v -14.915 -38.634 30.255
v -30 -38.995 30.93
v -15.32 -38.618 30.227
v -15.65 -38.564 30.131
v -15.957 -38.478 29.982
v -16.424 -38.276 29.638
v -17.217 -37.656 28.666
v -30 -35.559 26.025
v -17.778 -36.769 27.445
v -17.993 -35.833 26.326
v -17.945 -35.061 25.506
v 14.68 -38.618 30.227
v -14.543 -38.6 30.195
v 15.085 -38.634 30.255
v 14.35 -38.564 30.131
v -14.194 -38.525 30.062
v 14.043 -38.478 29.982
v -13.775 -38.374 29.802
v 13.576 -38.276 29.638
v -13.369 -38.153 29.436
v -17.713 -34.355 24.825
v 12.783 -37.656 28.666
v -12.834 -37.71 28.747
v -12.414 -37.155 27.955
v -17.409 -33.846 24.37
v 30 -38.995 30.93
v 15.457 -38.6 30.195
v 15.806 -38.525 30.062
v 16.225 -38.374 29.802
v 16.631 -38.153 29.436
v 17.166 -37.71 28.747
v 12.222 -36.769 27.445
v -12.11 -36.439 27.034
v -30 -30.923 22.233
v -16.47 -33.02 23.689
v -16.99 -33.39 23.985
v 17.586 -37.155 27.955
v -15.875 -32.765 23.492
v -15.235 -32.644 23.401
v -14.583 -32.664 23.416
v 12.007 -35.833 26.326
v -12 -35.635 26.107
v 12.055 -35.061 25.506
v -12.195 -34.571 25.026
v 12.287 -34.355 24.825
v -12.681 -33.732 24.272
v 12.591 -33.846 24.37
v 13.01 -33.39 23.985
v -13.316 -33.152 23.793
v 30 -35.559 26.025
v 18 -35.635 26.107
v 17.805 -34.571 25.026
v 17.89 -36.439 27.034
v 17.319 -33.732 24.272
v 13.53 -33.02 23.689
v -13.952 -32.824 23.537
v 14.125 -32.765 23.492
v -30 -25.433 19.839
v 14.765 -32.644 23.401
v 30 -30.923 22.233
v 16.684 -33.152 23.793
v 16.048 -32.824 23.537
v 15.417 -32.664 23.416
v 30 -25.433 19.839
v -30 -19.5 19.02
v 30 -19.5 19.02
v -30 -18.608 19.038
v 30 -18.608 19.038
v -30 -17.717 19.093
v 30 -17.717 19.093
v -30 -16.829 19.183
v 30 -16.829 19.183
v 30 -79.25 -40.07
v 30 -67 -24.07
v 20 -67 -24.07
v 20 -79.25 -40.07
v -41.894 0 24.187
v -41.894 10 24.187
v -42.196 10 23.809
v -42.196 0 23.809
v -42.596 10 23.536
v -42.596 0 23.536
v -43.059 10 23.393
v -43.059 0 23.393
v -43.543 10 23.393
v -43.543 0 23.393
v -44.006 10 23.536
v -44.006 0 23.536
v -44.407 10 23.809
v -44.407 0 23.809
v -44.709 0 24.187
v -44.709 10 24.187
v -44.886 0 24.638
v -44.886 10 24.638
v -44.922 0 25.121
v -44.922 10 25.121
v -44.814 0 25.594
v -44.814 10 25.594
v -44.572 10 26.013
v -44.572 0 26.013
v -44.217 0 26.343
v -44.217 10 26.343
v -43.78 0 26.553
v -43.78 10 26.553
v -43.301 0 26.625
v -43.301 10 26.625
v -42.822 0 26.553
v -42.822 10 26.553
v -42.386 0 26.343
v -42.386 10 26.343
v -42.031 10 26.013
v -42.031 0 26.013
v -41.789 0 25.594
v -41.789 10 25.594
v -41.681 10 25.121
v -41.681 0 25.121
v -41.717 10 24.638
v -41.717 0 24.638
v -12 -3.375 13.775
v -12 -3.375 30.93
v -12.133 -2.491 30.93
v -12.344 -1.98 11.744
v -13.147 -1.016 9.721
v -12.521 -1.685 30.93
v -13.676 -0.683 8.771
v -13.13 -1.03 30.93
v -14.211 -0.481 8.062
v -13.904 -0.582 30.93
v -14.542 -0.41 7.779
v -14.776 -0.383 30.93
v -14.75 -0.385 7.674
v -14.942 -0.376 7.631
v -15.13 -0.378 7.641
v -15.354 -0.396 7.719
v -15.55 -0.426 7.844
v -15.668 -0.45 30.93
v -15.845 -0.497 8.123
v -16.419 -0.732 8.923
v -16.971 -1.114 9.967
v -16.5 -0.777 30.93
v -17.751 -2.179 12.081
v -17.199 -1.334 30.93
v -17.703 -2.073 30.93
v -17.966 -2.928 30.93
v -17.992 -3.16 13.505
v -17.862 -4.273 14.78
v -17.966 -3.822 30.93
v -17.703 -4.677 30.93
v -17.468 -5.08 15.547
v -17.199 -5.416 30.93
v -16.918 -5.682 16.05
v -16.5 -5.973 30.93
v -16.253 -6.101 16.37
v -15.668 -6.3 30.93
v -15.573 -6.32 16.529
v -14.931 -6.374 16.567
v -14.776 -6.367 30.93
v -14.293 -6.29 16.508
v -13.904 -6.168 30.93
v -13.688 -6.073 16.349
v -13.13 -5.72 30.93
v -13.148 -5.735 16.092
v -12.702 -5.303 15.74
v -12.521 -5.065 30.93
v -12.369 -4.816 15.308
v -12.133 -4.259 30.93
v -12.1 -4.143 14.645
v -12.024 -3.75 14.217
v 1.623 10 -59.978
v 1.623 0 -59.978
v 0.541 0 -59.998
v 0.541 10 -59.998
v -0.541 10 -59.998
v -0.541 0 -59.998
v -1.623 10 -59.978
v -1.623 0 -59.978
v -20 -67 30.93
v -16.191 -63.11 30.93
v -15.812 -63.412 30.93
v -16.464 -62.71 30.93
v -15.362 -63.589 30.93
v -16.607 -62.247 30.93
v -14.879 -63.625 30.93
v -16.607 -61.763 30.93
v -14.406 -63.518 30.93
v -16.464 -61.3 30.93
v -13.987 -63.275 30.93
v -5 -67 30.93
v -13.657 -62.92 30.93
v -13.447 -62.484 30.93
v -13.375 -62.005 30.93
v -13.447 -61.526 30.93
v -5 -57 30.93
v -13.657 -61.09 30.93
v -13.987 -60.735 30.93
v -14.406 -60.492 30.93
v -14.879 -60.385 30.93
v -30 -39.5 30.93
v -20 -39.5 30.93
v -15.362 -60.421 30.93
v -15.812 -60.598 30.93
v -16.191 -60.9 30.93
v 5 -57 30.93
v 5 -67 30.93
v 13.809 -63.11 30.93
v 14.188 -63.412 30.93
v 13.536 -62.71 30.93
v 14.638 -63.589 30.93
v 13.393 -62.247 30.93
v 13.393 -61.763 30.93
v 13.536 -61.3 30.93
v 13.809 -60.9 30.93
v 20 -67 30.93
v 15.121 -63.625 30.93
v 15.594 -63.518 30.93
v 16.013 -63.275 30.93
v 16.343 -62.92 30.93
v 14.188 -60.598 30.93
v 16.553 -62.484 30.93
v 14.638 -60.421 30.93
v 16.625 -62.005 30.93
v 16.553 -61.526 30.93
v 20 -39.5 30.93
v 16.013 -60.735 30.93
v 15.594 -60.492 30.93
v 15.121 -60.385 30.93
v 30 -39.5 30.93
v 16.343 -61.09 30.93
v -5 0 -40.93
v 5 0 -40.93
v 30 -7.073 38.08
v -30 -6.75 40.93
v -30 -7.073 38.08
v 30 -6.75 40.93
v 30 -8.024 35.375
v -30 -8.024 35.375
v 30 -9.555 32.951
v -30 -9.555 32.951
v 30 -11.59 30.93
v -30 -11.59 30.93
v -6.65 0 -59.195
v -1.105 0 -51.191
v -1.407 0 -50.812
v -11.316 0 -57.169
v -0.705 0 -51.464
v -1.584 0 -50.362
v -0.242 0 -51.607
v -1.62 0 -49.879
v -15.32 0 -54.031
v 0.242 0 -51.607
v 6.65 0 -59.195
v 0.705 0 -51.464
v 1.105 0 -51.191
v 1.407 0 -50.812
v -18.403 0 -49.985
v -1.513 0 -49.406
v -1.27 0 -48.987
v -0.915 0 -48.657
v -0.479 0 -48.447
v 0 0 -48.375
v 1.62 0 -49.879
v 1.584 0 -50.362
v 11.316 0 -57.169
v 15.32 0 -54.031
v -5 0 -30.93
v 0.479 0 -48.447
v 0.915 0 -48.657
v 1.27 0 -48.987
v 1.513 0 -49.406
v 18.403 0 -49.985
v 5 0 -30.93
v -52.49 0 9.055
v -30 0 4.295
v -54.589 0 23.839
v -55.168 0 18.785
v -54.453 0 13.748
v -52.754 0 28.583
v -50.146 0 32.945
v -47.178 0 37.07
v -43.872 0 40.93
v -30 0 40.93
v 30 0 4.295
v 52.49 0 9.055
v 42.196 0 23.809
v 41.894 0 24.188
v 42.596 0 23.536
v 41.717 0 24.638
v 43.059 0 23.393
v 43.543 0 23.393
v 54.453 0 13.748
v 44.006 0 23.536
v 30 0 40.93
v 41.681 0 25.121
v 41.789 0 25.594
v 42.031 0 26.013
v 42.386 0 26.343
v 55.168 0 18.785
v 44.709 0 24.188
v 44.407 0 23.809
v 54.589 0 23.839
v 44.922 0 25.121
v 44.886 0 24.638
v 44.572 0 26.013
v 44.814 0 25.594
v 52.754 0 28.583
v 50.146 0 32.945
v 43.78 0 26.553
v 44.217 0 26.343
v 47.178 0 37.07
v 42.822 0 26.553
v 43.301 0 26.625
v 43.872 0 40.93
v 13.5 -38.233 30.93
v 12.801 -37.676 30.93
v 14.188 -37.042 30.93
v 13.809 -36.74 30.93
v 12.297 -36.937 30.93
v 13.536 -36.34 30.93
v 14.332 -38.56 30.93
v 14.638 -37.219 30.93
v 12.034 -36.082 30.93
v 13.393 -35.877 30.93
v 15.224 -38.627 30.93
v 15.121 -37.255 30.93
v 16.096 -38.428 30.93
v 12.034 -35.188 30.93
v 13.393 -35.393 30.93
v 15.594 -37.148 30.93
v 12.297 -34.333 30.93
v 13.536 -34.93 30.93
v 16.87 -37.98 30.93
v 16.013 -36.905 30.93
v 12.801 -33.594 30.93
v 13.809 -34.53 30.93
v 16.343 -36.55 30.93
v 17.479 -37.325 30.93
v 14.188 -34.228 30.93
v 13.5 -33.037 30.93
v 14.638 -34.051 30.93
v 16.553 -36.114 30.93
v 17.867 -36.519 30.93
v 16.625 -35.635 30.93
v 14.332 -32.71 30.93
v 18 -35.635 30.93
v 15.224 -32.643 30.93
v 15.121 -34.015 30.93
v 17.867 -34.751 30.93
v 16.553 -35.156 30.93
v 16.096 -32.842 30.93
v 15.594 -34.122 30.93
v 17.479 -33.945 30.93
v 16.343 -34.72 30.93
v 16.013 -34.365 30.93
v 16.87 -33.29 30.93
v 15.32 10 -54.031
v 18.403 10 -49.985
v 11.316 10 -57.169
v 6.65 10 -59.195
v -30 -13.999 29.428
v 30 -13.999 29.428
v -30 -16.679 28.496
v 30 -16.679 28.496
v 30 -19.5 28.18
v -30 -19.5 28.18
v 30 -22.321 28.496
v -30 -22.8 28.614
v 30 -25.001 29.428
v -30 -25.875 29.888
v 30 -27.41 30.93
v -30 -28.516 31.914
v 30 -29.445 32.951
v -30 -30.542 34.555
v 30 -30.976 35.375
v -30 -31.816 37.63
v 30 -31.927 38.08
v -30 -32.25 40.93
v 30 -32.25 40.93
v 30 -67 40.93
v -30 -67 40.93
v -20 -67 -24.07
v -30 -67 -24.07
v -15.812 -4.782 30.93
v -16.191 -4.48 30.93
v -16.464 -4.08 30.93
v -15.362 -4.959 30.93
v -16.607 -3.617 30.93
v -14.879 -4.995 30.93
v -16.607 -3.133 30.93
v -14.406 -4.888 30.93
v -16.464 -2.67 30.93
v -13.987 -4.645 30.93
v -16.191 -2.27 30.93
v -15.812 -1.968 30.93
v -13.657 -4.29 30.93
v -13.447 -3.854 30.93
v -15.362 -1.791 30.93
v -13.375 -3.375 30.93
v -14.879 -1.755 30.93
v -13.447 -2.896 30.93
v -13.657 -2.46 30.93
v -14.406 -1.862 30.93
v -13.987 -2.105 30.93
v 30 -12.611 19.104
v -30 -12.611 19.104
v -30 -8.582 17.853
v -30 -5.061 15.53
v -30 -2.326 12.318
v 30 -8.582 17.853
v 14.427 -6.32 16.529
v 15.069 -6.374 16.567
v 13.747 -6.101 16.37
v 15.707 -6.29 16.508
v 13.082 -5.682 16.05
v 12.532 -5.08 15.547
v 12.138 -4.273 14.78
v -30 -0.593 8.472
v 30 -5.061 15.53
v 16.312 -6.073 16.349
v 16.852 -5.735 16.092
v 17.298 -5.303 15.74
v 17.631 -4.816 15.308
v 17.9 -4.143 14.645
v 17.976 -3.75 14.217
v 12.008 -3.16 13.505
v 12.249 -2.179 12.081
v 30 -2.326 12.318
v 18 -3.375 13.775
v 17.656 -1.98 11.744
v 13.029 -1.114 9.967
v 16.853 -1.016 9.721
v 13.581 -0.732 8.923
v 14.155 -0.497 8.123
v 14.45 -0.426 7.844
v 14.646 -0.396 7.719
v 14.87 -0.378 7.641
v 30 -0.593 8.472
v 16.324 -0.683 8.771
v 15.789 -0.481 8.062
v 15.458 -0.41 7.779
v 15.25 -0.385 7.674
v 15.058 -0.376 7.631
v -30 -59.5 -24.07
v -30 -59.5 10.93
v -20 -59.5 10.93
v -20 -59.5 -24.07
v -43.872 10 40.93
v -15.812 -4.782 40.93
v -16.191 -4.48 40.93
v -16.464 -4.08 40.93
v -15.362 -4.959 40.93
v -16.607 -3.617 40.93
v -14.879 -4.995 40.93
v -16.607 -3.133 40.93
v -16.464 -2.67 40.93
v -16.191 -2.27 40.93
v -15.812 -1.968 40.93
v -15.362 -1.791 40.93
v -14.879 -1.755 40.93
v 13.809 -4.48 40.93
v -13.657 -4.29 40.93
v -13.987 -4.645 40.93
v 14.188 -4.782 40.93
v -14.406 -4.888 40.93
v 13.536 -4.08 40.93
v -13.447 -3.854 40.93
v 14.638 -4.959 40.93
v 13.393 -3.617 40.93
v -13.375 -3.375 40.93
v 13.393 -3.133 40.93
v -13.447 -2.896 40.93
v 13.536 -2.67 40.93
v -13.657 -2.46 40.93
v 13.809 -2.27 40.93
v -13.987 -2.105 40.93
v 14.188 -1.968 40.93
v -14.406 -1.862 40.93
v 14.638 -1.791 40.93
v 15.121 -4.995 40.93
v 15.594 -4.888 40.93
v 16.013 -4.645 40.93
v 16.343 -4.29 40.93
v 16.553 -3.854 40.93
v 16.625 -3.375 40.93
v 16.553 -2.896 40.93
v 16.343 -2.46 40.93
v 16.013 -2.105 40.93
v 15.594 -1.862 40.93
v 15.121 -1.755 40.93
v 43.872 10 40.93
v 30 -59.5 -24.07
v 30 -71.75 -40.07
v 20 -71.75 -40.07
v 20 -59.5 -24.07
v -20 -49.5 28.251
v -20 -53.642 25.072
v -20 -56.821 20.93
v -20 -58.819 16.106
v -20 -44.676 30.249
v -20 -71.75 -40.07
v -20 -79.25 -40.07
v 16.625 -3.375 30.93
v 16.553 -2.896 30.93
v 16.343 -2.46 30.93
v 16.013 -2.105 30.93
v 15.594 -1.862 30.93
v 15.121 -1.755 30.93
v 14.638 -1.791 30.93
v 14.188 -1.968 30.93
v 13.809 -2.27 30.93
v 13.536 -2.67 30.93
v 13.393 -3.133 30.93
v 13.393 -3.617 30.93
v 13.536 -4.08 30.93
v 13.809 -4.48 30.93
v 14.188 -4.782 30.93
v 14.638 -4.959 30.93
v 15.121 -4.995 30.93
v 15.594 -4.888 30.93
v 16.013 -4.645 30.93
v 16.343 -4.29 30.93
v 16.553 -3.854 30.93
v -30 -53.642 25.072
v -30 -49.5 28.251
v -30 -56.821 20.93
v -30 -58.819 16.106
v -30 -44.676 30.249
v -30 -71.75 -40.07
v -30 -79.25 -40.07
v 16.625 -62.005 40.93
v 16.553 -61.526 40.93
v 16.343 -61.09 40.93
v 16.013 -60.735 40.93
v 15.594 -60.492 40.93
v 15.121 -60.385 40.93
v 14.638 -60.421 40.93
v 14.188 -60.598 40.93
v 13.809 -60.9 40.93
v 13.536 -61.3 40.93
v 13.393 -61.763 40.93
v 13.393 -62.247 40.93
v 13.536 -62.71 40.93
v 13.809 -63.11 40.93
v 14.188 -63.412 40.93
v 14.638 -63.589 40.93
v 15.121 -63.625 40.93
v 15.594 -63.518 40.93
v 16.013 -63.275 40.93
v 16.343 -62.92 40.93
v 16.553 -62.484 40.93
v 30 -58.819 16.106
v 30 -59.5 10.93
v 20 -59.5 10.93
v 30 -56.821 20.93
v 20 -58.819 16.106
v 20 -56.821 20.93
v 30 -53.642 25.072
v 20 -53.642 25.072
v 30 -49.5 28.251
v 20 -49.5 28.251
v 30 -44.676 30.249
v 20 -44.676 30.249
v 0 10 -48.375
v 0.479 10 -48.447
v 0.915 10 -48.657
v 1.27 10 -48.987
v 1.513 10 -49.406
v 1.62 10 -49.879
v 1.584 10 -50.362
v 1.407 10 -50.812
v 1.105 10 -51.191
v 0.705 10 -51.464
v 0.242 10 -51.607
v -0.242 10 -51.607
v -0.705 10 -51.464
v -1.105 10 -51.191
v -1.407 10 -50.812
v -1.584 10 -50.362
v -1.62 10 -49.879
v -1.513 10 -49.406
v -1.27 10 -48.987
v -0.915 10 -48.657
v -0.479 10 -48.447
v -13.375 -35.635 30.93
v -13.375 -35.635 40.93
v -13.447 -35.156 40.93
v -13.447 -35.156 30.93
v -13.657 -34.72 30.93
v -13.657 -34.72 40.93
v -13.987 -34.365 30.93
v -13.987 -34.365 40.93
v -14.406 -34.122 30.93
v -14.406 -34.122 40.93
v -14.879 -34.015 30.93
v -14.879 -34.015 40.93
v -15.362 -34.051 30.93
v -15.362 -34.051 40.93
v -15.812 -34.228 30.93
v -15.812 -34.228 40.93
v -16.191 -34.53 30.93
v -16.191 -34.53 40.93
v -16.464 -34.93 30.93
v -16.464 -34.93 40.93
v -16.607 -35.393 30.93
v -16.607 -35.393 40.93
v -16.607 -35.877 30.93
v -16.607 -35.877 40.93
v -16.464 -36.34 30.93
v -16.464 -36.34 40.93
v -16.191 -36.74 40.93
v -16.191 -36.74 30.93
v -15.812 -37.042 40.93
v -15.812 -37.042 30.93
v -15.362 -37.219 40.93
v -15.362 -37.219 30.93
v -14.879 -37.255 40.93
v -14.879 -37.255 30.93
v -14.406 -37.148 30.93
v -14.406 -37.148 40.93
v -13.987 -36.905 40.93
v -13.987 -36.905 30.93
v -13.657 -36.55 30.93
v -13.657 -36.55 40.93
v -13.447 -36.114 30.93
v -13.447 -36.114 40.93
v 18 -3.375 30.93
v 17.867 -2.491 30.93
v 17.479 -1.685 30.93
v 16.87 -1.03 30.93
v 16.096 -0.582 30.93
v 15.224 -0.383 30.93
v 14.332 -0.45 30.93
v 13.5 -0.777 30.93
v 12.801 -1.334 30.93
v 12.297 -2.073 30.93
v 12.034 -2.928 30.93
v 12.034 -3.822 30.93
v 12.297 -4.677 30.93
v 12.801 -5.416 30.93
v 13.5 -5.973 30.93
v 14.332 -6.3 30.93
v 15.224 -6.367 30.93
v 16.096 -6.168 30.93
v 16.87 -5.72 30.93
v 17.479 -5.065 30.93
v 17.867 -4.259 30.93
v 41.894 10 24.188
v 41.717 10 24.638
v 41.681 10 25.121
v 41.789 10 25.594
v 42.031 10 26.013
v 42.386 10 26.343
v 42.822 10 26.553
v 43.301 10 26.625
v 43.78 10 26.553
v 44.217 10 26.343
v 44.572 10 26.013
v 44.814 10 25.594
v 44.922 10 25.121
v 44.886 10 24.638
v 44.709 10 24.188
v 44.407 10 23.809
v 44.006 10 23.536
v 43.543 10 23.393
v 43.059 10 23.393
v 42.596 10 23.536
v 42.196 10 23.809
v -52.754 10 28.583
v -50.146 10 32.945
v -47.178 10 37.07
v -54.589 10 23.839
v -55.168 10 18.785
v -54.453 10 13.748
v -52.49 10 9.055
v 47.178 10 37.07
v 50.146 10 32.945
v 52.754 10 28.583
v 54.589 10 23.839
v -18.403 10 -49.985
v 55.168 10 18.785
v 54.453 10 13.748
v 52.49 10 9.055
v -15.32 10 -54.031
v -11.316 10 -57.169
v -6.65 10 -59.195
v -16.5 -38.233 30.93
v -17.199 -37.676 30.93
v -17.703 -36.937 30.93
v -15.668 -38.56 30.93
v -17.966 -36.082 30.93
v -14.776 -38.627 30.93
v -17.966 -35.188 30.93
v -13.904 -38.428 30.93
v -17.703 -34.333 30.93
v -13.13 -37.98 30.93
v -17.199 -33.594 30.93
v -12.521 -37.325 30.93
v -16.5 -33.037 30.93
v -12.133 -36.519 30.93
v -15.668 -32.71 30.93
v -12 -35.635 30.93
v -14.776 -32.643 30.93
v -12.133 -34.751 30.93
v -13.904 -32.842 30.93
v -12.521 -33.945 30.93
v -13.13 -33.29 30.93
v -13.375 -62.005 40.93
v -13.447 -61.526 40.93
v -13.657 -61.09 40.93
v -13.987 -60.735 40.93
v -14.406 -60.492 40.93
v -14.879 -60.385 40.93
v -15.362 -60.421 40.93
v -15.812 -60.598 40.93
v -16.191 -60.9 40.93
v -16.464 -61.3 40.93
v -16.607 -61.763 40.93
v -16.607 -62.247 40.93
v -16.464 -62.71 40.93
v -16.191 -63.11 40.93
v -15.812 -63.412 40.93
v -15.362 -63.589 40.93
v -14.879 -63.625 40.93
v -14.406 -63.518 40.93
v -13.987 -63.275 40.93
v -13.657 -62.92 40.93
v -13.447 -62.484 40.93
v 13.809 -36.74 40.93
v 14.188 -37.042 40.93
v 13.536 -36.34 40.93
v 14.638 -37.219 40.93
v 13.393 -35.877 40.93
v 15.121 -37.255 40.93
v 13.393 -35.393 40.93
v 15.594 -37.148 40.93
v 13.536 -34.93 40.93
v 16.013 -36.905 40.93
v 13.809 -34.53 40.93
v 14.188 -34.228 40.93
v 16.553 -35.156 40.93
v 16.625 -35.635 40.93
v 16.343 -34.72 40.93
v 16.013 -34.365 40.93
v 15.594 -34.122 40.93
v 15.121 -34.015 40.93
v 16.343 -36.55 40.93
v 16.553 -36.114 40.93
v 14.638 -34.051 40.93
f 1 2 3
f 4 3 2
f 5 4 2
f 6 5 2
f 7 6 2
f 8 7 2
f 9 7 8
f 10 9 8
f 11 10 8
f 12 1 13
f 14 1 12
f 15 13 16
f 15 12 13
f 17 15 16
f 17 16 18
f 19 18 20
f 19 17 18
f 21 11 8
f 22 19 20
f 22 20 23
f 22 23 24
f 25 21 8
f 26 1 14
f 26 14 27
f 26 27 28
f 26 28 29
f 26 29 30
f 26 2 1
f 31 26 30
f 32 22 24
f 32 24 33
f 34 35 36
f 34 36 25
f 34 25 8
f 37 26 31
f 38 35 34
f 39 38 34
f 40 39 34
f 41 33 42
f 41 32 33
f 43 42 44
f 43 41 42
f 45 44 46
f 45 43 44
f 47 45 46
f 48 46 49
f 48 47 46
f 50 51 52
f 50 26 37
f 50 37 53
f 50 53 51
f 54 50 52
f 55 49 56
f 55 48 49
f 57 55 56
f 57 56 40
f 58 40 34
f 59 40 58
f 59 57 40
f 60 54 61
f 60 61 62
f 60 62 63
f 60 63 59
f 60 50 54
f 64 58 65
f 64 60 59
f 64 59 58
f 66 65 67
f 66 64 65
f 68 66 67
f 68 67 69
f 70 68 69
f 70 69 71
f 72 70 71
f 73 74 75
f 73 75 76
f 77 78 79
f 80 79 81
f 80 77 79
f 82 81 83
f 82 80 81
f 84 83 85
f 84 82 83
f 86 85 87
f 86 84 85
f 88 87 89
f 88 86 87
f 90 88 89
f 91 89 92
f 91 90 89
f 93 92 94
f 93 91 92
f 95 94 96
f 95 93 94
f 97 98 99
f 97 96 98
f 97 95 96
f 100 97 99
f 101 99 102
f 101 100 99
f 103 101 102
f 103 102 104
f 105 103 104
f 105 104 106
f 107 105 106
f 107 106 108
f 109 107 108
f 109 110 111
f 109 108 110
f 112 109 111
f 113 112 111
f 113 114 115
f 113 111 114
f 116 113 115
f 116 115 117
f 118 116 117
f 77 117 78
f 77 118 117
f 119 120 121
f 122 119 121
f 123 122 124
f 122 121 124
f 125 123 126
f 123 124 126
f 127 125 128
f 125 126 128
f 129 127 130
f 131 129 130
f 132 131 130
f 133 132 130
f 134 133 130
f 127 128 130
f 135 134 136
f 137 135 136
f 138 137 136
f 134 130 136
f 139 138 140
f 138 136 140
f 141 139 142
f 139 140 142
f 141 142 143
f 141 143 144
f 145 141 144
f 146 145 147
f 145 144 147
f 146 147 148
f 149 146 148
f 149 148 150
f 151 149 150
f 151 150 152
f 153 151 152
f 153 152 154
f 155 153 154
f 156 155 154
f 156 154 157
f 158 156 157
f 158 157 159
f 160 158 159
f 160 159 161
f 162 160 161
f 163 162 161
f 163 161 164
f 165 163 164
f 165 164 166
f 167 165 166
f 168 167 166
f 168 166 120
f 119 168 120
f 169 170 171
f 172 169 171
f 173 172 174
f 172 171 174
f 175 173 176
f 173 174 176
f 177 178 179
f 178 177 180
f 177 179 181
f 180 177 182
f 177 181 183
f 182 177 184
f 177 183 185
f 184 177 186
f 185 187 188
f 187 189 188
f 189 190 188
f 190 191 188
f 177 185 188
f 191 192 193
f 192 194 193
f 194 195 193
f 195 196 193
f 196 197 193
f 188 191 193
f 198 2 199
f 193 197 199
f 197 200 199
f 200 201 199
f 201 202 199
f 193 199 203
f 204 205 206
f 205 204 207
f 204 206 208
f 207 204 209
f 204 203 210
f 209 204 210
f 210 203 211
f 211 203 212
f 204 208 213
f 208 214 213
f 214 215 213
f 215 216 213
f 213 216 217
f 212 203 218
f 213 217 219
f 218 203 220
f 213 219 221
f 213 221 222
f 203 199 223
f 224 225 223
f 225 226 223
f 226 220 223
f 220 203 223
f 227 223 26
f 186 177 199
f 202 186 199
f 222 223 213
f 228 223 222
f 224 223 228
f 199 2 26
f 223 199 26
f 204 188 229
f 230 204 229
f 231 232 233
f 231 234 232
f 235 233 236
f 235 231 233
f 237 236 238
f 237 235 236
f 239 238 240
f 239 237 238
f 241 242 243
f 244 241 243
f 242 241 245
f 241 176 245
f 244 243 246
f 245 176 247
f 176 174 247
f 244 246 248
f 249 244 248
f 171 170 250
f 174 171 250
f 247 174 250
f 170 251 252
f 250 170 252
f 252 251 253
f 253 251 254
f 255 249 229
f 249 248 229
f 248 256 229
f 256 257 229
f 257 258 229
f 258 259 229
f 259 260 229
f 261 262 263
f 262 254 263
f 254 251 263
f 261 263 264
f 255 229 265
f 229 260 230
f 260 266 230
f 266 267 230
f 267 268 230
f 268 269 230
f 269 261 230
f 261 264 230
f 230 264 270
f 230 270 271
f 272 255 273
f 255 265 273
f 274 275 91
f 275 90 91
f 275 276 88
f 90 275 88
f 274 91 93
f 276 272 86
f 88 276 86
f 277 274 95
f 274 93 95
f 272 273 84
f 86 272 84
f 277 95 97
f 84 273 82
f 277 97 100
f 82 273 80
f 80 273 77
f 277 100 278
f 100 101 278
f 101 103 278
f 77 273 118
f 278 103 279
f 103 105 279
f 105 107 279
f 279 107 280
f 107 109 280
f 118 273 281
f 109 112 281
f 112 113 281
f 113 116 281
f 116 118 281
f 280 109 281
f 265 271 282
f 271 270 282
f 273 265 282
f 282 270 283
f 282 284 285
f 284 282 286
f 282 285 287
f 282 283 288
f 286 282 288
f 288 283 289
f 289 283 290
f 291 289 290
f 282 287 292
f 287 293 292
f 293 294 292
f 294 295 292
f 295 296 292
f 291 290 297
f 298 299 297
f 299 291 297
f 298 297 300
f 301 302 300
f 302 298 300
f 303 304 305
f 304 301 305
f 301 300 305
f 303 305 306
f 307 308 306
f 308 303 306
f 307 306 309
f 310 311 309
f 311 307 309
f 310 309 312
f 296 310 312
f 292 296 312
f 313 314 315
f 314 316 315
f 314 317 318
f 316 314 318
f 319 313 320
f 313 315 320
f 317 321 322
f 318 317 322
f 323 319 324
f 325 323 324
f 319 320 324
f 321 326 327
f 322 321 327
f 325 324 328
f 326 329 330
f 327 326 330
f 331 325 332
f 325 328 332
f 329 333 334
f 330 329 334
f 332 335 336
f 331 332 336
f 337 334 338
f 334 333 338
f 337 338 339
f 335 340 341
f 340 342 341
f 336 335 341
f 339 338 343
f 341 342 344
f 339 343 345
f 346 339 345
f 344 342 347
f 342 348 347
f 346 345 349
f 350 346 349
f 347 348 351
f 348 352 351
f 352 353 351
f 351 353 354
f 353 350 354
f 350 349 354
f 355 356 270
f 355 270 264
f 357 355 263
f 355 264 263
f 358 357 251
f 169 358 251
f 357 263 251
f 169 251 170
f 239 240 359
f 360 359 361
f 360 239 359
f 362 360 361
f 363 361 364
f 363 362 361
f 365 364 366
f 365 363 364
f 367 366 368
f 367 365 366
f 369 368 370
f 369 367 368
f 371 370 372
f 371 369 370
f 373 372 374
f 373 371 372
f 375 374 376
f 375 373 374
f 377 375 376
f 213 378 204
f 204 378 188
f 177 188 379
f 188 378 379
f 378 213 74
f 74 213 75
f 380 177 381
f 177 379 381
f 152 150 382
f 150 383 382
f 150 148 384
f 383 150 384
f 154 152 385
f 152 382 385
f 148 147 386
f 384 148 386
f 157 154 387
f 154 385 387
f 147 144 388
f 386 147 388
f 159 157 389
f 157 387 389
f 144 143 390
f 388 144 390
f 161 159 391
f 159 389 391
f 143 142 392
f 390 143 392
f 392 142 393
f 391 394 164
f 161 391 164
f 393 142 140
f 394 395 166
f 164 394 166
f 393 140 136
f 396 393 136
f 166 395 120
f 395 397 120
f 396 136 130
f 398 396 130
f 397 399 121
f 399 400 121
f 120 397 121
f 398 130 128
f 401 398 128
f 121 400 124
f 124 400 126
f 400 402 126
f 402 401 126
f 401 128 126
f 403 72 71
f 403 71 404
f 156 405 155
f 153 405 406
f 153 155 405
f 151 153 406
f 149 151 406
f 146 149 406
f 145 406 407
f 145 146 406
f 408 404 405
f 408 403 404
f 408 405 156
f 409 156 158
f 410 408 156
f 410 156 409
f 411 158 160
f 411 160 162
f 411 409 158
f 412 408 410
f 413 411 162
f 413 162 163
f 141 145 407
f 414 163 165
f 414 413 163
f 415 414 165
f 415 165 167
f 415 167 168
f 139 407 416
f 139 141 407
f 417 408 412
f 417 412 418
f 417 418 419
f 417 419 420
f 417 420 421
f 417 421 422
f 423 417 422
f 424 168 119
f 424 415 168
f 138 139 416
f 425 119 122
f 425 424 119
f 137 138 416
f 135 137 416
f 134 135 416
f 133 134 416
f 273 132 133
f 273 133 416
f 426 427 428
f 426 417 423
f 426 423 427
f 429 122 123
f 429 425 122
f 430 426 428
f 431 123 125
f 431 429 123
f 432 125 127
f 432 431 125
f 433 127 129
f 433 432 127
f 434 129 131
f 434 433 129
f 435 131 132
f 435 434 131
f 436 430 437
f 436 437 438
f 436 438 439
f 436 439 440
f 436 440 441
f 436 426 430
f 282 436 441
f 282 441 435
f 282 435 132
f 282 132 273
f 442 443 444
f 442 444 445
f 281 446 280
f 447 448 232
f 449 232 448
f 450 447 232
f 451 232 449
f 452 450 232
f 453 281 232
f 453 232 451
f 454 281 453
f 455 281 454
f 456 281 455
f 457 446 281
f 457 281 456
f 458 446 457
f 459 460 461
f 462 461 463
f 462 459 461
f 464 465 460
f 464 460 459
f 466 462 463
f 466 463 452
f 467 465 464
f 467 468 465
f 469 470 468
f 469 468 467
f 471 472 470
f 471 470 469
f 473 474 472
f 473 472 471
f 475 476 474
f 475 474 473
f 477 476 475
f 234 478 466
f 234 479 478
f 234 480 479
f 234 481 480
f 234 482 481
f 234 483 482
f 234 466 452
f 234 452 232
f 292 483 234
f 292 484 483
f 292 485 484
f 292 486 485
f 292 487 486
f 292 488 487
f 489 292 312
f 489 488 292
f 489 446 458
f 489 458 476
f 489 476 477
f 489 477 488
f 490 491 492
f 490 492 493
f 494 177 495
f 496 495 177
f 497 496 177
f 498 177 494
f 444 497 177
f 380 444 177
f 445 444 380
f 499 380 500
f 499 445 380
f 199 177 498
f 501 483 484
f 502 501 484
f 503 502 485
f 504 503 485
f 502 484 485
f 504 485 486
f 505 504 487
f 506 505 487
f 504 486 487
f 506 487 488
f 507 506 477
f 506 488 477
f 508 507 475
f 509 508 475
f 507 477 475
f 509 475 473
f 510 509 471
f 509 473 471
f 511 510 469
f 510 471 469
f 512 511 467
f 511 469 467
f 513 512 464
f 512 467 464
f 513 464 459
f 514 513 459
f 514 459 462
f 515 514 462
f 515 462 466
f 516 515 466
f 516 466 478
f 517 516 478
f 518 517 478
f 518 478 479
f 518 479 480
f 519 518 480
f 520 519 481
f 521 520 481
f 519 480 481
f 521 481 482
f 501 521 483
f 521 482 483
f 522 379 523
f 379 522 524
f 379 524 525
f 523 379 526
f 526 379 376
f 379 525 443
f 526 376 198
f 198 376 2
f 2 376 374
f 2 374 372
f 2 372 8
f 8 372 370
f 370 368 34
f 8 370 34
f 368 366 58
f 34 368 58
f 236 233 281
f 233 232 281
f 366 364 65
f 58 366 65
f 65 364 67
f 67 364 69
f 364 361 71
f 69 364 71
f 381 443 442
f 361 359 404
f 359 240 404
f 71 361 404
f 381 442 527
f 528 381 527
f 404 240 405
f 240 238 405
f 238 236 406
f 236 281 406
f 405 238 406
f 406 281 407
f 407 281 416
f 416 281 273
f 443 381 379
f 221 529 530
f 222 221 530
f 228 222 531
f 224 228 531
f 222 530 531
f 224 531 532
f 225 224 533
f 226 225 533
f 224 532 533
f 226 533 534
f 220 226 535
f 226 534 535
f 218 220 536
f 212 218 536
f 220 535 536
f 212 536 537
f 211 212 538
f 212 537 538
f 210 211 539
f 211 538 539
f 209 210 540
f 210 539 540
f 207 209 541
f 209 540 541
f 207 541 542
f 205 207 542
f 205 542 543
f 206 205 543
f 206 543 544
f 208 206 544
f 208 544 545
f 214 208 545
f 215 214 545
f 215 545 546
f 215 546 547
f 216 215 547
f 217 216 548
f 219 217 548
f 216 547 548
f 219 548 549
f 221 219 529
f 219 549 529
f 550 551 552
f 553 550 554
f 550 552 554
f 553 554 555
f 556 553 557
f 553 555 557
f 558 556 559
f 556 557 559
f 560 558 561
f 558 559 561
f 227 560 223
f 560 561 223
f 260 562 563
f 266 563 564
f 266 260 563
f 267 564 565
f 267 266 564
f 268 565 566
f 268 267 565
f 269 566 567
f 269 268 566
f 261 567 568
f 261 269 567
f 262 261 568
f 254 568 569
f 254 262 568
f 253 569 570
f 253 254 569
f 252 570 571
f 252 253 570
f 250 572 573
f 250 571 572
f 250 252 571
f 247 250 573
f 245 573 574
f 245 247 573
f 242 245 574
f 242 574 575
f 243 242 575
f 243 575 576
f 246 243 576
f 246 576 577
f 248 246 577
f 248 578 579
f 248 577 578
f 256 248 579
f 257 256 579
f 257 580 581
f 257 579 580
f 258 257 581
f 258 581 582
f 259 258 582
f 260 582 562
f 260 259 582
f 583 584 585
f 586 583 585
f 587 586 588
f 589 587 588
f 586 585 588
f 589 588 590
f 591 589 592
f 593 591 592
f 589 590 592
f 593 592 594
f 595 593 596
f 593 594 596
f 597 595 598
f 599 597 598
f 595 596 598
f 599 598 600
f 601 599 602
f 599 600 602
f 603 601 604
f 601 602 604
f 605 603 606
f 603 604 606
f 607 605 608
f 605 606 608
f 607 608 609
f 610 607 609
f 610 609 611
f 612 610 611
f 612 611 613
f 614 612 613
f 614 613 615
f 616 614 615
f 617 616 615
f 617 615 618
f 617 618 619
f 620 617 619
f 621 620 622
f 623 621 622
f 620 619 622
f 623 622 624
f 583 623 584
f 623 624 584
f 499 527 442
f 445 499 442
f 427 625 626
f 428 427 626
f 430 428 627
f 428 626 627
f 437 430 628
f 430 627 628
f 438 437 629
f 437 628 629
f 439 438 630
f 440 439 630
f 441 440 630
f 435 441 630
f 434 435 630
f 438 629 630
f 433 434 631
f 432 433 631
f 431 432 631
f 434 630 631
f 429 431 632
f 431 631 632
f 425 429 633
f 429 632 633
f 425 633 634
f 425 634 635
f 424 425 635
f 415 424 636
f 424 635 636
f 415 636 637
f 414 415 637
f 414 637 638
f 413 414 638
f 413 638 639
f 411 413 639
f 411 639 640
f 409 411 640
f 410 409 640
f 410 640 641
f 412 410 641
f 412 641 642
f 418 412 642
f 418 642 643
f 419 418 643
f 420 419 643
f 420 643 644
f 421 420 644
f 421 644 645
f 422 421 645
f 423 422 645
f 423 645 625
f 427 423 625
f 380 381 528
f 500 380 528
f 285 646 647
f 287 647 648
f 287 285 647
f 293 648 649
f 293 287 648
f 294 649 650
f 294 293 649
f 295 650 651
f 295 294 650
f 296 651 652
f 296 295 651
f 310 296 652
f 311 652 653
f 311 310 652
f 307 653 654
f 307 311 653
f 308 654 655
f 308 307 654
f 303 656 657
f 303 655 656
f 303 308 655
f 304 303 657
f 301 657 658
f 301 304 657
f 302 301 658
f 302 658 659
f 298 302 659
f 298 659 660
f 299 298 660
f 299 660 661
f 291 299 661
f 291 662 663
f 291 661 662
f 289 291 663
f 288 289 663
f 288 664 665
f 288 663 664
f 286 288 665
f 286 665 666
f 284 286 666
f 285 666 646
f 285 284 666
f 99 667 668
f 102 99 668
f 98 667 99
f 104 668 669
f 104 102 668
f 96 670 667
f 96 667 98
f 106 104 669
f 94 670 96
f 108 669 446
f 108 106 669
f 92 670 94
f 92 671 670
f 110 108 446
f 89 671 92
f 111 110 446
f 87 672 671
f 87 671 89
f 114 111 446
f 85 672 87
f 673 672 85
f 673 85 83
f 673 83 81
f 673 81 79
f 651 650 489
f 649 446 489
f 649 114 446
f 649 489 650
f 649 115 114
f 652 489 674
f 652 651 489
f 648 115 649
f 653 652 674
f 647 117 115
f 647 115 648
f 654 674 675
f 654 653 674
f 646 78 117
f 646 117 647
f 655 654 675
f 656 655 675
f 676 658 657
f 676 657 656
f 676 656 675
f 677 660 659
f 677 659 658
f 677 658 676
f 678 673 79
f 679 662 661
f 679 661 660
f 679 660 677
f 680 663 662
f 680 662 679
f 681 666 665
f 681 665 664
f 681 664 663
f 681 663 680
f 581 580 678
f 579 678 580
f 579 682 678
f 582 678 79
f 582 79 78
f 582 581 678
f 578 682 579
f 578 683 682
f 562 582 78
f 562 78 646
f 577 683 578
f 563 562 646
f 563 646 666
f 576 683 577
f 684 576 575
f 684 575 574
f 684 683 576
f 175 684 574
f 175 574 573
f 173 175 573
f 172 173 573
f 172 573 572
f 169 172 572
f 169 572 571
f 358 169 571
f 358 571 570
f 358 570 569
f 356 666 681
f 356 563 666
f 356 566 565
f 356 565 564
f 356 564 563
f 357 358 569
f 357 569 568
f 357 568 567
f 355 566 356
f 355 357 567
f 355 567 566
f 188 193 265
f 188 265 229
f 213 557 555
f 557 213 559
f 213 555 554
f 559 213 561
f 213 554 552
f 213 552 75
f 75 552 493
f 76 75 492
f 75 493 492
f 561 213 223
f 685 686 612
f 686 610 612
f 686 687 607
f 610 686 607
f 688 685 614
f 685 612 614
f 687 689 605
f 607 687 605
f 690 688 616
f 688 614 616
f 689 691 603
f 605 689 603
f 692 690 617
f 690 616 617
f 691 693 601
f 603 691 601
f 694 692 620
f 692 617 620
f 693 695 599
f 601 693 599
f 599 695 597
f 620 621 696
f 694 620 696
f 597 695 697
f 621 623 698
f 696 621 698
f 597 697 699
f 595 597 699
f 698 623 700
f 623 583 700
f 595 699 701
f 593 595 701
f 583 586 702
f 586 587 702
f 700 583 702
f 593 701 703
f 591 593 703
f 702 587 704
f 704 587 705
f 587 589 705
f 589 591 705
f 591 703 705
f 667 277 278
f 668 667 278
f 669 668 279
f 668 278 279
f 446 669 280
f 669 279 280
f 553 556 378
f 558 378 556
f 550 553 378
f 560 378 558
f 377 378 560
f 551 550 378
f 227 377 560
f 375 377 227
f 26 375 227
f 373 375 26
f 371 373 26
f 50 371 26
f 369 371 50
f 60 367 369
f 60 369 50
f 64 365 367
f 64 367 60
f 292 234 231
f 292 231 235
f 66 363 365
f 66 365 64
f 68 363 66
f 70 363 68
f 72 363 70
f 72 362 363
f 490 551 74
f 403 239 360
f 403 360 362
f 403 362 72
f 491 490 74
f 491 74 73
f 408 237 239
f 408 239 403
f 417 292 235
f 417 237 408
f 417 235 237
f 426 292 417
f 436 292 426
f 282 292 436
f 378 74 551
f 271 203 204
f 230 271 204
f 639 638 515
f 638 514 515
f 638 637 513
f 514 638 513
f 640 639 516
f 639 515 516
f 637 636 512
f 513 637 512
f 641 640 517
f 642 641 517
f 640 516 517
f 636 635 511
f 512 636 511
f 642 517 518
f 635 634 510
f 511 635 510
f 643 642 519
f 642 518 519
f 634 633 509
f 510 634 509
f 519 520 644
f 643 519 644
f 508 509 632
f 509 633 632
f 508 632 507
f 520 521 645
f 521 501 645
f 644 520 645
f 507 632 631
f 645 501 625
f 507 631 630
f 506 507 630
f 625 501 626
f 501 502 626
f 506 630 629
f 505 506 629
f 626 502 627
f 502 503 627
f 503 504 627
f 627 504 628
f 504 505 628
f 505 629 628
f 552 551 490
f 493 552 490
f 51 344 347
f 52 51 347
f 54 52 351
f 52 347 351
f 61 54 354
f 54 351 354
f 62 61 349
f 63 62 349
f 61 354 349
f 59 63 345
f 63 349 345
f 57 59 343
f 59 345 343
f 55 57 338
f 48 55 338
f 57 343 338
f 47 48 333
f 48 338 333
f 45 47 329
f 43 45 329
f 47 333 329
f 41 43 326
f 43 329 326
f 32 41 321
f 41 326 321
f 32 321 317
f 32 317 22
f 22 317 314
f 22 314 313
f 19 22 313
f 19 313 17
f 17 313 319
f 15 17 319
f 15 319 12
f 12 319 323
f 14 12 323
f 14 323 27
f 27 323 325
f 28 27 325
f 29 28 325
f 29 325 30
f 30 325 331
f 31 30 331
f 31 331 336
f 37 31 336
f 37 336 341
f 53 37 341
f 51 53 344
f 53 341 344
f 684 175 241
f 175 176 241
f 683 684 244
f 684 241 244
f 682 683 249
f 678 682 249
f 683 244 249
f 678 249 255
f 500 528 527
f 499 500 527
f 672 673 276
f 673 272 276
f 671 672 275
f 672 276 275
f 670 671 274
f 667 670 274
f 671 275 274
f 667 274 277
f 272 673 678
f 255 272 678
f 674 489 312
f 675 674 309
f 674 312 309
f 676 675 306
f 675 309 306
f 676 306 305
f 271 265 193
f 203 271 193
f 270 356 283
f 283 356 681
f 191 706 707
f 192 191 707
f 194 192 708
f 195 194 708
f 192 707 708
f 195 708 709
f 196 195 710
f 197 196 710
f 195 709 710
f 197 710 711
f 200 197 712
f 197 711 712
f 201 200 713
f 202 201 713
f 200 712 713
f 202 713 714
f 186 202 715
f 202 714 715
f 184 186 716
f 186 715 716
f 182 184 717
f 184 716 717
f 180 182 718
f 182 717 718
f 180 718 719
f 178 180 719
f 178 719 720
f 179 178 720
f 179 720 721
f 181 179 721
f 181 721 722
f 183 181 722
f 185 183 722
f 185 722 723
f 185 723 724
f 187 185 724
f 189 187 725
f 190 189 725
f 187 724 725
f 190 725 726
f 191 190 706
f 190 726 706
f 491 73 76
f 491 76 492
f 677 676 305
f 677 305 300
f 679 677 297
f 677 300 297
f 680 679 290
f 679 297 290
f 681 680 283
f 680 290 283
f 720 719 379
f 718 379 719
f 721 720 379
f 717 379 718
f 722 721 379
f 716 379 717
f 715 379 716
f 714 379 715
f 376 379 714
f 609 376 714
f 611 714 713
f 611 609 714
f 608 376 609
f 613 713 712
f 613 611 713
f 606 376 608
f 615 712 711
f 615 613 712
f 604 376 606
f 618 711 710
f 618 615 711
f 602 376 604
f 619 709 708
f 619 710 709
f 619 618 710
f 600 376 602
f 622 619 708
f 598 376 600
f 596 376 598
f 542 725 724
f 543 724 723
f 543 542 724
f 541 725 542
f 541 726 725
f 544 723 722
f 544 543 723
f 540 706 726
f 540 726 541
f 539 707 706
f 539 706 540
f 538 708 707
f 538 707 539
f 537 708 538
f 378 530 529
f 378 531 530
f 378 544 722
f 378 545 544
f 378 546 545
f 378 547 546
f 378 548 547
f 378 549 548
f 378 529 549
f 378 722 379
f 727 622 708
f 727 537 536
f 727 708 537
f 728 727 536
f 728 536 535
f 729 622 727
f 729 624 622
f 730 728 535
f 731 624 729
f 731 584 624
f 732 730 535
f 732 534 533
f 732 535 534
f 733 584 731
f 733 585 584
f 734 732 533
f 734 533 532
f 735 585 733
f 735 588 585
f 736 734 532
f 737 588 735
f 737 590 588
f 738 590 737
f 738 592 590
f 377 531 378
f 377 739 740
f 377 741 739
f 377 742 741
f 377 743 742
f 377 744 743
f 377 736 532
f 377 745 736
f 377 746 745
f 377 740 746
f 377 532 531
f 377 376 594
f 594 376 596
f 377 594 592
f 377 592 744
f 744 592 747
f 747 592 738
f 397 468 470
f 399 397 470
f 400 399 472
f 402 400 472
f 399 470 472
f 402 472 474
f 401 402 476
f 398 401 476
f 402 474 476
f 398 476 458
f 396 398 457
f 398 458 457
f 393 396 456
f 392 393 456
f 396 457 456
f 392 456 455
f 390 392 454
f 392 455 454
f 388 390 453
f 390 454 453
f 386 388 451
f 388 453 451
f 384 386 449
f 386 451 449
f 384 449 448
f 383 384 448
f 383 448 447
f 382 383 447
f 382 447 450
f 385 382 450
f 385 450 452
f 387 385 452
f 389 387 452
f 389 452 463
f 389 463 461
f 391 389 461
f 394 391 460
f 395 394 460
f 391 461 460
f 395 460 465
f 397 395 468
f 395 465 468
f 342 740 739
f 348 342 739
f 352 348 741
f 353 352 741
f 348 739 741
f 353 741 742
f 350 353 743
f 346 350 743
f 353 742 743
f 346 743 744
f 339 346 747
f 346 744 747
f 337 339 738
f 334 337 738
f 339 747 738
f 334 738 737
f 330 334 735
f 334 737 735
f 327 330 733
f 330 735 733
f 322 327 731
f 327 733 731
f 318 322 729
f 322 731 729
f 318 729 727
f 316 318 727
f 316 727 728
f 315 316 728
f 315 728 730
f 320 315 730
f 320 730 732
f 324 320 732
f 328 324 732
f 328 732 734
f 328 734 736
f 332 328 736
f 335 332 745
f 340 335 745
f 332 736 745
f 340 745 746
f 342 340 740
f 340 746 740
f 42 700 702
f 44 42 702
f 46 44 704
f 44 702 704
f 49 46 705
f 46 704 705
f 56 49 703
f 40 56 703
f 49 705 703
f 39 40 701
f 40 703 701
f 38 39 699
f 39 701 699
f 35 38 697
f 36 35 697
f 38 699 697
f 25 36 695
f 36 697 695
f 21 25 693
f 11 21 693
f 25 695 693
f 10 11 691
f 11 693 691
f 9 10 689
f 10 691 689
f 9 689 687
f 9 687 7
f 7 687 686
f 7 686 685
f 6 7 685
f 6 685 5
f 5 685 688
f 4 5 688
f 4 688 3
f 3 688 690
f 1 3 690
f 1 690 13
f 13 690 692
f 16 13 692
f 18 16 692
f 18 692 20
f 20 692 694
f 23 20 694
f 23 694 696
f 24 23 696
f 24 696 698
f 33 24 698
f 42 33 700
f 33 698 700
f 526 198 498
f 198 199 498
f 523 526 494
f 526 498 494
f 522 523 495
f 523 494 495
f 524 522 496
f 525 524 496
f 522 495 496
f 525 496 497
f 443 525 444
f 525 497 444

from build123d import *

# Parameters (mm, degrees)
SKETCH1_R                       = 60
BOSS_EXTRUDE1_DEPTH             = 10
SKETCH1_3_R                     = 1.625
CUT_EXTRUDE1_DEPTH              = 86.440037453
CIRPATTERN1_COUNT               = 3
CUT_EXTRUDE2_DEPTH              = 86.440037453
CIRPATTERN2_COUNT               = 3
BOSS_EXTRUDE2_DEPTH             = 77
BOSS_EXTRUDE3_REACH             = 108.685
BOSS_EXTRUDE3_DIRECTION_2_REACH = 108.685
FILLET1_R                       = 15
CUT_EXTRUDE3_DEPTH              = 107.685194831
CUT_EXTRUDE3_DEPTH_BACK         = 107.685194831
SKETCH4_4_R                     = 12.75
BOSS_EXTRUDE4_DEPTH             = 5
BOSS_EXTRUDE4_DEPTH_BACK        = 5
SKETCH7_R                       = 3
CUT_EXTRUDE4_DEPTH              = 135.046990627
SKETCH8_R                       = 3
SKETCH8_R_2                     = 1.625
BOSS_EXTRUDE5_DEPTH             = 10
LPATTERN2_COUNT                 = 2
LPATTERN2_PITCH                 = 32.26
LPATTERN3_COUNT                 = 2
LPATTERN3_PITCH                 = 58.63
FILLET2_R                       = 20
FILLET3_R                       = 20
FILLET4_R                       = 20
FILLET5_R                       = 20
SKETCH9_W                       = 55
SKETCH9_H                       = 7.5
BOSS_EXTRUDE6_DEPTH             = 10
BOSS_EXTRUDE7_DEPTH             = 10
FILLET6_R                       = 20
FILLET7_R                       = 20


with BuildPart() as part:
    # Sketch1 → Boss-Extrude1 (new body)
    with BuildSketch(Plane(origin=(0, 0, 0), x_dir=(1, 0, 0), z_dir=(0, 1, 0))):
        with Locations(Location((0, 0, 0), (0, 0, 270))):
            Circle(SKETCH1_R)
    extrude(amount=BOSS_EXTRUDE1_DEPTH)

    # Sketch1<3> → Cut-Extrude1 (cut, through all)
    with BuildSketch(Plane(origin=(0, 0, 0), x_dir=(1, 0, 0), z_dir=(0, 1, 0))):
        with Locations(Location((0, 50, 0), (0, 0, 270))):
            Circle(SKETCH1_3_R)
    cut_extrude1 = extrude(amount=CUT_EXTRUDE1_DEPTH, mode=Mode.SUBTRACT)

    # CirPattern1: Cut-Extrude1 ×3 about axis
    cirpattern1_axis = Axis((0, 0, 0), (0, 1, 0))
    for i in range(1, CIRPATTERN1_COUNT):
        add(cut_extrude1.rotate(cirpattern1_axis, i * 360 / CIRPATTERN1_COUNT), mode=Mode.SUBTRACT)

    # Sketch2 → Cut-Extrude2 (cut, through all)
    with BuildSketch(Plane(origin=(0, 10, 0), x_dir=(1, 0, 0), z_dir=(0, 1, 0))):
        with BuildLine():
            Line((43.871803017, -40.93), (0, -40.93))
            Line((0, -40.93), (-43.871803017, -40.93))
            ThreePointArc((-43.871803017, -40.93), (0, -60), (43.871803017, -40.93))
        make_face()
    cut_extrude2 = extrude(amount=-CUT_EXTRUDE2_DEPTH, mode=Mode.SUBTRACT)

    # CirPattern2: Cut-Extrude2 ×3 about axis
    cirpattern2_axis = Axis((0, 10.5, 0), (0, -1, 0))
    for i in range(1, CIRPATTERN2_COUNT):
        add(cut_extrude2.rotate(cirpattern2_axis, i * 360 / CIRPATTERN2_COUNT), mode=Mode.SUBTRACT)

    # Sketch3 → Boss-Extrude2 (add)
    with BuildSketch(Plane(origin=(0, 10, 0), x_dir=(1, 0, 0), z_dir=(0, 1, 0))):
        Polygon((-30, -40.93), (0, -40.93), (30, -40.93), (30, -30.93), (-30, -30.93), align=None)
    extrude(amount=-BOSS_EXTRUDE2_DEPTH)

    # Boss-Extrude3: up to this face of the body (flat: up to its plane)
    boss_extrude3_end = Plane(part.part.faces().sort_by_distance((30, -33.5, 35.93))[0])
    # Sketch4 → Boss-Extrude3 (add, up to the picked face)
    with BuildSketch(Plane(origin=(0, 0, 0), x_dir=(0, 0, -1), z_dir=(1, 0, 0)), mode=Mode.PRIVATE) as boss_extrude3_sk1:
        with BuildLine():
            ThreePointArc((-19.02, -19.5), (-22.236059714, -8.072633873), (-30.940100101, 0))
            Line((-30.940100101, 0), (-40.93, 0))
            Line((-40.93, 0), (-40.93, -6.75))
            ThreePointArc((-40.93, -6.75), (-31.91438854, -10.48438854), (-28.18, -19.5))
            ThreePointArc((-28.18, -19.5), (-31.91438854, -28.51561146), (-40.93, -32.25))
            Line((-40.93, -32.25), (-40.93, -41.41))
            ThreePointArc((-40.93, -41.41), (-25.437290424, -34.992709576), (-19.02, -19.5))
        make_face()
    boss_extrude3_tool1 = split(extrude(boss_extrude3_sk1.sketch, amount=BOSS_EXTRUDE3_REACH, mode=Mode.PRIVATE), bisect_by=boss_extrude3_end, keep=Keep.BOTH, mode=Mode.PRIVATE)
    add(boss_extrude3_tool1.solids().sort_by(Axis((0, -10.153116, 31.583116), (1, 0, 0)))[0])

    # Boss-Extrude3 direction 2: up to this face of the body (flat: up to its plane)
    boss_extrude3_direction_2_end = Plane(part.part.faces().sort_by_distance((-30, -33.5, 35.93))[0])
    # Sketch4 → Boss-Extrude3 direction 2 (add, up to the picked face)
    with BuildSketch(Plane(origin=(0, 0, 0), x_dir=(0, 0, -1), z_dir=(1, 0, 0)), mode=Mode.PRIVATE) as boss_extrude3_direction_2_sk1:
        with BuildLine():
            ThreePointArc((-19.02, -19.5), (-22.236059714, -8.072633873), (-30.940100101, 0))
            Line((-30.940100101, 0), (-40.93, 0))
            Line((-40.93, 0), (-40.93, -6.75))
            ThreePointArc((-40.93, -6.75), (-31.91438854, -10.48438854), (-28.18, -19.5))
            ThreePointArc((-28.18, -19.5), (-31.91438854, -28.51561146), (-40.93, -32.25))
            Line((-40.93, -32.25), (-40.93, -41.41))
            ThreePointArc((-40.93, -41.41), (-25.437290424, -34.992709576), (-19.02, -19.5))
        make_face()
    boss_extrude3_direction_2_tool1 = split(extrude(boss_extrude3_direction_2_sk1.sketch, amount=-BOSS_EXTRUDE3_DIRECTION_2_REACH, mode=Mode.PRIVATE), bisect_by=boss_extrude3_direction_2_end, keep=Keep.BOTH, mode=Mode.PRIVATE)
    add(boss_extrude3_direction_2_tool1.solids().sort_by(Axis((0, -10.153116, 31.583116), (-1, 0, 0)))[0])

    # Fillet1
    # the kernel refuses this fillet: 15 mm, written as the material it adds along each edge
    with BuildSketch(Plane(origin=(30, 0, 30.93), x_dir=(0, -0.8200000187317444, -0.5723634940140216), z_dir=(-1, 0, 0))) as fillet1_piece_1:
        with BuildLine():
            CenterArc((27.544705674, -13.254966901), FILLET1_R, 117.912385257, 97.002819116)
            Line((15.244705393, -21.840419312), (14.014705365, -22.698964553))
            Line((14.014705365, -22.698964553), (-1.230000028, -0.858545241))
            Line((-1.230000028, -0.858545241), (-0.858545241, 1.230000028))
            ThreePointArc((-0.858545241, 1.230000028), (0.706809752, 1.32825728), (19.820711794, 1.32549669))
            Line((19.820711794, 1.32549669), (20.522893056, 0))
        make_face()
    extrude(amount=60)
    with BuildSketch(Plane(origin=(30, -0.00517761, 30.93), x_dir=(0, -0.819917344642304, -0.5724819193255918), z_dir=(-1, 0, 0))) as fillet1_piece_2:
        with BuildLine():
            CenterArc((27.542374568, -13.253952614), FILLET1_R, 117.920660394, 97.002819116)
            Line((15.243614398, -21.841181404), (14.013738381, -22.699904283))
            ThreePointArc((14.013738381, -22.699904283), (-1.23412123, -0.861686967), (-0.858722879, 1.229876017))
            Line((-0.858722879, 1.229876017), (0.702372694, 1.325395261))
            ThreePointArc((0.702372694, 1.325395261), (10.259323815, -1.050393215), (19.816274935, 1.325395261))
            Line((19.816274935, 1.325395261), (20.518647629, 0))
        make_face()
    extrude(amount=60)

    # Sketch4<4> → Cut-Extrude3 (cut, two sides: drawn at the far end of the back side and taken through both)
    with BuildSketch(Plane(origin=(0, 0, 0), x_dir=(0, 0, -1), z_dir=(1, 0, 0)).offset(-CUT_EXTRUDE3_DEPTH_BACK)):
        with Locations((-40.93, -19.5)):
            Circle(SKETCH4_4_R)
    extrude(amount=CUT_EXTRUDE3_DEPTH + CUT_EXTRUDE3_DEPTH_BACK, mode=Mode.SUBTRACT)

    # Sketch6 → Boss-Extrude4 (add, two sides: drawn at the far end of the back side and taken through both)
    with BuildSketch(Plane(origin=(0, 0, 0), x_dir=(0, 0, -1), z_dir=(1, 0, 0)).offset(-BOSS_EXTRUDE4_DEPTH_BACK)):
        Polygon((-30.93, -57), (-30.93, -67), (40.93, 0), (30.93, 0), align=None)
    extrude(amount=BOSS_EXTRUDE4_DEPTH + BOSS_EXTRUDE4_DEPTH_BACK)

    # Sketch7 → Cut-Extrude4 (cut, through all)
    with BuildSketch(Plane.XY.offset(40.93)):
        with Locations((-15, -3.375)):
            Circle(SKETCH7_R)
        with Locations((15, -3.375)):
            Circle(SKETCH7_R)
    cut_extrude4 = extrude(amount=-CUT_EXTRUDE4_DEPTH, mode=Mode.SUBTRACT)

    # Sketch8 → Boss-Extrude5 (add)
    # profile 1 of 2: a face of its own
    with BuildSketch(Plane.XY.offset(40.93)):
        with Locations((-15, -3.375)):
            Circle(SKETCH8_R)
        with Locations((-15, -3.375)):
            Circle(SKETCH8_R_2, mode=Mode.SUBTRACT)
    # profile 2 of 2: a face of its own
    with BuildSketch(Plane.XY.offset(40.93)):
        with Locations((15, -3.375)):
            Circle(SKETCH8_R)
        with Locations((15, -3.375)):
            Circle(SKETCH8_R_2, mode=Mode.SUBTRACT)
    boss_extrude5 = extrude(amount=-BOSS_EXTRUDE5_DEPTH)

    # LPattern2: Cut-Extrude4, Boss-Extrude5 ×2
    with Locations(*[(0, -i * LPATTERN2_PITCH, 0) for i in range(1, LPATTERN2_COUNT)]):
        add(cut_extrude4, mode=Mode.SUBTRACT)
        add(boss_extrude5)

    # LPattern3: Cut-Extrude4, Boss-Extrude5 ×2
    with Locations(*[(0, -i * LPATTERN3_PITCH, 0) for i in range(1, LPATTERN3_COUNT)]):
        add(cut_extrude4, mode=Mode.SUBTRACT)
        add(boss_extrude5)

    # Fillet2
    fillet2_edges = [part.edges().sort_by_distance(p)[0] for p in [
        (57.382321286, 5, 17.529095923),
    ]]
    fillet(fillet2_edges, radius=FILLET2_R)

    # Fillet3
    fillet3_edges = [part.edges().sort_by_distance(p)[0] for p in [
        (13.510518268, 5, -58.459095923),
    ]]
    fillet(fillet3_edges, radius=FILLET3_R)

    # Fillet4
    fillet4_edges = [part.edges().sort_by_distance(p)[0] for p in [
        (-13.510518268, 5, -58.459095923),
    ]]
    fillet(fillet4_edges, radius=FILLET4_R)

    # Fillet5
    fillet5_edges = [part.edges().sort_by_distance(p)[0] for p in [
        (-57.382321286, 5, 17.529095923),
    ]]
    fillet(fillet5_edges, radius=FILLET5_R)

    # Sketch9 → Boss-Extrude6 (add)
    with BuildSketch(Plane(origin=(30, 0, 0), x_dir=(0, 0, -1), z_dir=(1, 0, 0))):
        with Locations((-3.43, -63.25)):
            Rectangle(SKETCH9_W, SKETCH9_H)
    boss_extrude6 = extrude(amount=-BOSS_EXTRUDE6_DEPTH)

    # Sketch10 → Boss-Extrude7 (add)
    with BuildSketch(Plane(origin=(30, 0, 0), x_dir=(0, 0, -1), z_dir=(1, 0, 0))):
        Polygon((40.07, -79.25), (40.07, -71.75), (24.07, -59.5), (24.07, -67), align=None)
    boss_extrude7 = extrude(amount=-BOSS_EXTRUDE7_DEPTH)

    # Fillet6
    fillet6_edges = [part.edges().sort_by_distance(p)[0] for p in [
        (25, -59.5, 30.93),
    ]]
    fillet(fillet6_edges, radius=FILLET6_R)

    # Mirror1: Boss-Extrude6, Boss-Extrude7 across plane
    add(boss_extrude6.mirror(Plane(origin=(0, 0, 0), x_dir=(0, 0, 1), z_dir=(1, 0, 0))))
    add(boss_extrude7.mirror(Plane(origin=(0, 0, 0), x_dir=(0, 0, 1), z_dir=(1, 0, 0))))

    # Fillet7
    fillet7_edges = [part.edges().sort_by_distance(p)[0] for p in [
        (-25, -59.5, 30.93),
    ]]
    fillet(fillet7_edges, radius=FILLET7_R)


solid = part.part
